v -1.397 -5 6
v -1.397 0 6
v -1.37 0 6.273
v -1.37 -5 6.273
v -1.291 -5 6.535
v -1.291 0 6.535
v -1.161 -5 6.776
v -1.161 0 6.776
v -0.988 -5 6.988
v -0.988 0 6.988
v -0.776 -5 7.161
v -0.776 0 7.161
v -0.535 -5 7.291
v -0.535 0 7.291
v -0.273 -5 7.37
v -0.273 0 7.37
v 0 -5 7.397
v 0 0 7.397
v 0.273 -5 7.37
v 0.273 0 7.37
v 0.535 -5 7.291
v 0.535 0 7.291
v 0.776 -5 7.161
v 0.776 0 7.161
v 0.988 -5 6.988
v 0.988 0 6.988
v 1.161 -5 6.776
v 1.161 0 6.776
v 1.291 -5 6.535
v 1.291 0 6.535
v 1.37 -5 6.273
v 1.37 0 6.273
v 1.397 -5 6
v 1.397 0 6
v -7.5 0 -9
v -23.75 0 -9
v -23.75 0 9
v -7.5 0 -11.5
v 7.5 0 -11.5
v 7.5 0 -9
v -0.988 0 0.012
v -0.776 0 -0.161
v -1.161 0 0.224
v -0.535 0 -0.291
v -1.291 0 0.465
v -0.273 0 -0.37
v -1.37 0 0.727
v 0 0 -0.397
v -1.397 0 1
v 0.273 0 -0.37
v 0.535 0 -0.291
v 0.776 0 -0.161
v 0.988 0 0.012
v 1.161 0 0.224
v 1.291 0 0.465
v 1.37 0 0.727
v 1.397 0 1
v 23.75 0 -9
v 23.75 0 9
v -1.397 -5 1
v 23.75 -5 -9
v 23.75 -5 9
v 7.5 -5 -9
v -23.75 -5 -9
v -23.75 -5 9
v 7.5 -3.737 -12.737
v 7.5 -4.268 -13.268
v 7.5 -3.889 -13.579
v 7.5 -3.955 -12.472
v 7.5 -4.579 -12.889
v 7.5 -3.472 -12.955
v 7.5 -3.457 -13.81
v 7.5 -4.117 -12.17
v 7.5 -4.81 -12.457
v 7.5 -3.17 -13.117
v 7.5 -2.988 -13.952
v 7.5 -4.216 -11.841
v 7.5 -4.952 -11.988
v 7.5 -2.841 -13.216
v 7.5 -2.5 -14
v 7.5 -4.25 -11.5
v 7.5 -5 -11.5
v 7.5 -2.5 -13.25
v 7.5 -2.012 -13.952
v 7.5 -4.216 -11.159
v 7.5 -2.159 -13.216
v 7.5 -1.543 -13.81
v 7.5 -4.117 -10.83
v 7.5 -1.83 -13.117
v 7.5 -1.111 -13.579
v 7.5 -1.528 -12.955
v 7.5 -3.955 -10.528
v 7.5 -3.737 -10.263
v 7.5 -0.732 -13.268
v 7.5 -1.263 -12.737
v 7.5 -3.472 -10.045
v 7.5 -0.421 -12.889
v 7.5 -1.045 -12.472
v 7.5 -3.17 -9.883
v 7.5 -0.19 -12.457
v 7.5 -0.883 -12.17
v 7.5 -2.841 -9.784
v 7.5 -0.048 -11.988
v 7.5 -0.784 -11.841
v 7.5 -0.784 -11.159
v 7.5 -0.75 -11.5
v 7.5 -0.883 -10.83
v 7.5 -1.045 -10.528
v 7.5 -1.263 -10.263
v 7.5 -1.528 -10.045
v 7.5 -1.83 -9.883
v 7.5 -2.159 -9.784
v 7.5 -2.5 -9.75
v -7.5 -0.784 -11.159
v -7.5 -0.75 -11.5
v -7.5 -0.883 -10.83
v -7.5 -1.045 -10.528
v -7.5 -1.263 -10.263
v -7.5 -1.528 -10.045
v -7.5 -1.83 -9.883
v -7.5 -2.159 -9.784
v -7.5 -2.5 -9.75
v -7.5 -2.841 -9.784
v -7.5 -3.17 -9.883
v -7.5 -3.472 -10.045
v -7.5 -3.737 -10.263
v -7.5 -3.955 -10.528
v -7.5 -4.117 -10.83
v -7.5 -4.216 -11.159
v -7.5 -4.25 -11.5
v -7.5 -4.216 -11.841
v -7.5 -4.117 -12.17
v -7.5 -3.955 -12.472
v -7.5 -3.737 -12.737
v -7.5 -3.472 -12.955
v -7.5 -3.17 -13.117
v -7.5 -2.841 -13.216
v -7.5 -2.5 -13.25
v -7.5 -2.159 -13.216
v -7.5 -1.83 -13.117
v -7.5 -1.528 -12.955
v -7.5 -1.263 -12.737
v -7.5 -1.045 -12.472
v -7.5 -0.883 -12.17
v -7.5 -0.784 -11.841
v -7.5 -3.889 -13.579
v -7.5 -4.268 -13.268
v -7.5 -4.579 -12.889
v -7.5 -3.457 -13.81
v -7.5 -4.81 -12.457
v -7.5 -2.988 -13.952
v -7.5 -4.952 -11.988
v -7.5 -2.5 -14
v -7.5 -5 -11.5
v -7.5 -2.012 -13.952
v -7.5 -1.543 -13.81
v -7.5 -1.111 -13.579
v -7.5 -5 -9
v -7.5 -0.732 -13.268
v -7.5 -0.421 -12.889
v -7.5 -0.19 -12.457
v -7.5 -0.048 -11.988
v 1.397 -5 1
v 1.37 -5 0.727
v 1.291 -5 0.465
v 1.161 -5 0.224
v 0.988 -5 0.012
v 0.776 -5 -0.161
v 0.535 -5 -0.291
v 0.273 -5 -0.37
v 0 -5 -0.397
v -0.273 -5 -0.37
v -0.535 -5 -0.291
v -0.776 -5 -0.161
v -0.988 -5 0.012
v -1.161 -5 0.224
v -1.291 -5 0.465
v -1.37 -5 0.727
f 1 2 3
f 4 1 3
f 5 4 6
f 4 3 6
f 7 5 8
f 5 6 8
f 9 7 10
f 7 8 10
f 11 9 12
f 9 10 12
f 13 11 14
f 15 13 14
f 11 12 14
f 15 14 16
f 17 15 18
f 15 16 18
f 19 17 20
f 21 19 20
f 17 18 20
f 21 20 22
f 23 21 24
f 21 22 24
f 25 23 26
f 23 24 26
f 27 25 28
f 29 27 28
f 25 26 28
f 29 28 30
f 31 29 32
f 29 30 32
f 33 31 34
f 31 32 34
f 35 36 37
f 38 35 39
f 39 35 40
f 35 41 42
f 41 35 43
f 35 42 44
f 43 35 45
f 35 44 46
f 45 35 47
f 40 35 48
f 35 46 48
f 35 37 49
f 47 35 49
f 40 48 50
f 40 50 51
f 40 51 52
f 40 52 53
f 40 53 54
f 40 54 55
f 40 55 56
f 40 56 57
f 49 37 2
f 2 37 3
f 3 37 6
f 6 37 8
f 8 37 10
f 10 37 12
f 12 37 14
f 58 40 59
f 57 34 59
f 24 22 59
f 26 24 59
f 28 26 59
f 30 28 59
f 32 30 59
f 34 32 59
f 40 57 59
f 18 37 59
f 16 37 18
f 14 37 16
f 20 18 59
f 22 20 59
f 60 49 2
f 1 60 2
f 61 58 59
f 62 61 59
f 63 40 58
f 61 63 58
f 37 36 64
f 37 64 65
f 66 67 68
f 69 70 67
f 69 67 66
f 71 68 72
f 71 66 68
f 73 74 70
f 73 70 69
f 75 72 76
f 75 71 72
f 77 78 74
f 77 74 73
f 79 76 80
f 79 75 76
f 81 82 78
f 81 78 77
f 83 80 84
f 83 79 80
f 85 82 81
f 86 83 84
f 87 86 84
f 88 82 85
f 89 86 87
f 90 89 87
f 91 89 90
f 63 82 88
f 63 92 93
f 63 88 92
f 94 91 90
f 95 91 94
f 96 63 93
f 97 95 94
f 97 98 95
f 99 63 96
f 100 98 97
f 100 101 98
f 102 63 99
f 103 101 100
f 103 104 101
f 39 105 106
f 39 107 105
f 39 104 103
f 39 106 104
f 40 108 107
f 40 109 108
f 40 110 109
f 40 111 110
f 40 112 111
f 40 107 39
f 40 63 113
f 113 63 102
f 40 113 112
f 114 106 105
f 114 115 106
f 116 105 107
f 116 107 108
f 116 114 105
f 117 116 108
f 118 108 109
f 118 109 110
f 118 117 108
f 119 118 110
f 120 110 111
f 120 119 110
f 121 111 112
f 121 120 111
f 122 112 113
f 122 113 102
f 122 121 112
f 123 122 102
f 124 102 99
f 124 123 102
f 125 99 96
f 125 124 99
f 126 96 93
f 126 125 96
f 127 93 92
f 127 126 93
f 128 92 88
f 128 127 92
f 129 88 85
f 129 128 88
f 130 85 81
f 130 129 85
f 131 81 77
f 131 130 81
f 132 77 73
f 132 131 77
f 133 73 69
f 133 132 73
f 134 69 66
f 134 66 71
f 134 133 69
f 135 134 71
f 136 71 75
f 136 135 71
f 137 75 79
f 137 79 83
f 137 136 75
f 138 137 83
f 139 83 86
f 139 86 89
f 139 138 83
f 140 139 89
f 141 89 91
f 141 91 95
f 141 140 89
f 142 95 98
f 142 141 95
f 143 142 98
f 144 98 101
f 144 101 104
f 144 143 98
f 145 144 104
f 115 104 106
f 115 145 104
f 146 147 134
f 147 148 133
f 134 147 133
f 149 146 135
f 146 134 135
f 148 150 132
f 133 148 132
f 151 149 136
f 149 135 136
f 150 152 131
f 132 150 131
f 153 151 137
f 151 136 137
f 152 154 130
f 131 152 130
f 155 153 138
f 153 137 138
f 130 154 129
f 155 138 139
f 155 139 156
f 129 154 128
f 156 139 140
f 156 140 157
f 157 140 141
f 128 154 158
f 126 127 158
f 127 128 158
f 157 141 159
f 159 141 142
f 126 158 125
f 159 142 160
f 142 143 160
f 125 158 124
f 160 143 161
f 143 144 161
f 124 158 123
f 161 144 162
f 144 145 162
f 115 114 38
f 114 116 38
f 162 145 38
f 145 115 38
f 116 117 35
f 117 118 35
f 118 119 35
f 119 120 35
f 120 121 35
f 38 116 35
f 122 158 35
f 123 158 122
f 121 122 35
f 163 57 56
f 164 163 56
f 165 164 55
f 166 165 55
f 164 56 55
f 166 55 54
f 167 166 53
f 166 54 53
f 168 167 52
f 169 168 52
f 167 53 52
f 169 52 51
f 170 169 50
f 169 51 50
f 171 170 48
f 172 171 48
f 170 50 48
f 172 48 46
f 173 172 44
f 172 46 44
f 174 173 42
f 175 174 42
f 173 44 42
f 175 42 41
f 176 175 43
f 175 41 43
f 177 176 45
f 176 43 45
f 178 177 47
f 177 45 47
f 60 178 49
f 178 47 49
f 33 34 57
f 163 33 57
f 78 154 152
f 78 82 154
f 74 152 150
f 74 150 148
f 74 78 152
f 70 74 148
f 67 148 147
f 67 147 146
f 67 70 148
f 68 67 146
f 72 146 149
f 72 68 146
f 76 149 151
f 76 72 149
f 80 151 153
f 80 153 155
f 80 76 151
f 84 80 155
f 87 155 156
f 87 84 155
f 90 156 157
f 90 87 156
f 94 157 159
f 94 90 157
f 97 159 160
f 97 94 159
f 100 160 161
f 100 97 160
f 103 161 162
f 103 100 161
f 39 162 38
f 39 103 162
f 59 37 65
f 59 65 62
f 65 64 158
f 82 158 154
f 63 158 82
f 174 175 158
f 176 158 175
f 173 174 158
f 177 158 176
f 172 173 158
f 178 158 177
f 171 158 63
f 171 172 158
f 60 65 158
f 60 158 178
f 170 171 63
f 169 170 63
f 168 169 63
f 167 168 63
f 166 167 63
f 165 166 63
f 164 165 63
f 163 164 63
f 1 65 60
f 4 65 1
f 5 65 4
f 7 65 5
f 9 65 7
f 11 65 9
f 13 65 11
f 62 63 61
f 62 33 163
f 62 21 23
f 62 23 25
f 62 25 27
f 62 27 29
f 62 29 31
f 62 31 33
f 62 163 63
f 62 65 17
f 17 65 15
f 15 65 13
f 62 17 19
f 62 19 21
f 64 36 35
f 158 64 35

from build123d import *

# Parameters (mm, degrees)
F0_W     = 47.5
F0_H     = 18
F1_DEPTH = 5
F3_R     = 1.75
F4_DEPTH = 7.5


with BuildPart() as f1:
    # F0 (on Front) → F1 (new body)
    with BuildSketch(Plane.XZ):
        Rectangle(F0_W, F0_H)
        with BuildLine():
            ThreePointArc((1.396902, 1), (0, -0.396902), (-1.396902, 1))
            Line((-1.396902, 1), (-1.396902, 6))
            ThreePointArc((-1.396902, 6), (0, 7.396902), (1.396902, 6))
            Line((1.396902, 6), (1.396902, 1))
        make_face(mode=Mode.SUBTRACT)
    extrude(amount=F1_DEPTH)

    # F3 (on Right) → F4 (join, symmetric)
    with BuildSketch(Plane.YZ):
        with BuildLine():
            ThreePointArc((-2.5, -9), (-4.267767, -9.732233), (-5, -11.5))
            ThreePointArc((-5, -11.5), (-2.5, -14), (0, -11.5))
            ThreePointArc((0, -11.5), (-0.732233, -9.732233), (-2.5, -9))
        make_face()
        with Locations((-2.5, -11.5)):
            Circle(F3_R, mode=Mode.SUBTRACT)
        with BuildLine():
            ThreePointArc((-2.5, -9), (-0.732233, -9.732233), (0, -11.5))
            Line((0, -11.5), (0, -9))
            Line((0, -9), (-2.5, -9))
        make_face()
        with BuildLine():
            Line((-5, -9), (-5, -11.5))
            ThreePointArc((-5, -11.5), (-4.267767, -9.732233), (-2.5, -9))
            Line((-2.5, -9), (-5, -9))
        make_face()
    extrude(amount=F4_DEPTH, both=True)


solid = f1.part
